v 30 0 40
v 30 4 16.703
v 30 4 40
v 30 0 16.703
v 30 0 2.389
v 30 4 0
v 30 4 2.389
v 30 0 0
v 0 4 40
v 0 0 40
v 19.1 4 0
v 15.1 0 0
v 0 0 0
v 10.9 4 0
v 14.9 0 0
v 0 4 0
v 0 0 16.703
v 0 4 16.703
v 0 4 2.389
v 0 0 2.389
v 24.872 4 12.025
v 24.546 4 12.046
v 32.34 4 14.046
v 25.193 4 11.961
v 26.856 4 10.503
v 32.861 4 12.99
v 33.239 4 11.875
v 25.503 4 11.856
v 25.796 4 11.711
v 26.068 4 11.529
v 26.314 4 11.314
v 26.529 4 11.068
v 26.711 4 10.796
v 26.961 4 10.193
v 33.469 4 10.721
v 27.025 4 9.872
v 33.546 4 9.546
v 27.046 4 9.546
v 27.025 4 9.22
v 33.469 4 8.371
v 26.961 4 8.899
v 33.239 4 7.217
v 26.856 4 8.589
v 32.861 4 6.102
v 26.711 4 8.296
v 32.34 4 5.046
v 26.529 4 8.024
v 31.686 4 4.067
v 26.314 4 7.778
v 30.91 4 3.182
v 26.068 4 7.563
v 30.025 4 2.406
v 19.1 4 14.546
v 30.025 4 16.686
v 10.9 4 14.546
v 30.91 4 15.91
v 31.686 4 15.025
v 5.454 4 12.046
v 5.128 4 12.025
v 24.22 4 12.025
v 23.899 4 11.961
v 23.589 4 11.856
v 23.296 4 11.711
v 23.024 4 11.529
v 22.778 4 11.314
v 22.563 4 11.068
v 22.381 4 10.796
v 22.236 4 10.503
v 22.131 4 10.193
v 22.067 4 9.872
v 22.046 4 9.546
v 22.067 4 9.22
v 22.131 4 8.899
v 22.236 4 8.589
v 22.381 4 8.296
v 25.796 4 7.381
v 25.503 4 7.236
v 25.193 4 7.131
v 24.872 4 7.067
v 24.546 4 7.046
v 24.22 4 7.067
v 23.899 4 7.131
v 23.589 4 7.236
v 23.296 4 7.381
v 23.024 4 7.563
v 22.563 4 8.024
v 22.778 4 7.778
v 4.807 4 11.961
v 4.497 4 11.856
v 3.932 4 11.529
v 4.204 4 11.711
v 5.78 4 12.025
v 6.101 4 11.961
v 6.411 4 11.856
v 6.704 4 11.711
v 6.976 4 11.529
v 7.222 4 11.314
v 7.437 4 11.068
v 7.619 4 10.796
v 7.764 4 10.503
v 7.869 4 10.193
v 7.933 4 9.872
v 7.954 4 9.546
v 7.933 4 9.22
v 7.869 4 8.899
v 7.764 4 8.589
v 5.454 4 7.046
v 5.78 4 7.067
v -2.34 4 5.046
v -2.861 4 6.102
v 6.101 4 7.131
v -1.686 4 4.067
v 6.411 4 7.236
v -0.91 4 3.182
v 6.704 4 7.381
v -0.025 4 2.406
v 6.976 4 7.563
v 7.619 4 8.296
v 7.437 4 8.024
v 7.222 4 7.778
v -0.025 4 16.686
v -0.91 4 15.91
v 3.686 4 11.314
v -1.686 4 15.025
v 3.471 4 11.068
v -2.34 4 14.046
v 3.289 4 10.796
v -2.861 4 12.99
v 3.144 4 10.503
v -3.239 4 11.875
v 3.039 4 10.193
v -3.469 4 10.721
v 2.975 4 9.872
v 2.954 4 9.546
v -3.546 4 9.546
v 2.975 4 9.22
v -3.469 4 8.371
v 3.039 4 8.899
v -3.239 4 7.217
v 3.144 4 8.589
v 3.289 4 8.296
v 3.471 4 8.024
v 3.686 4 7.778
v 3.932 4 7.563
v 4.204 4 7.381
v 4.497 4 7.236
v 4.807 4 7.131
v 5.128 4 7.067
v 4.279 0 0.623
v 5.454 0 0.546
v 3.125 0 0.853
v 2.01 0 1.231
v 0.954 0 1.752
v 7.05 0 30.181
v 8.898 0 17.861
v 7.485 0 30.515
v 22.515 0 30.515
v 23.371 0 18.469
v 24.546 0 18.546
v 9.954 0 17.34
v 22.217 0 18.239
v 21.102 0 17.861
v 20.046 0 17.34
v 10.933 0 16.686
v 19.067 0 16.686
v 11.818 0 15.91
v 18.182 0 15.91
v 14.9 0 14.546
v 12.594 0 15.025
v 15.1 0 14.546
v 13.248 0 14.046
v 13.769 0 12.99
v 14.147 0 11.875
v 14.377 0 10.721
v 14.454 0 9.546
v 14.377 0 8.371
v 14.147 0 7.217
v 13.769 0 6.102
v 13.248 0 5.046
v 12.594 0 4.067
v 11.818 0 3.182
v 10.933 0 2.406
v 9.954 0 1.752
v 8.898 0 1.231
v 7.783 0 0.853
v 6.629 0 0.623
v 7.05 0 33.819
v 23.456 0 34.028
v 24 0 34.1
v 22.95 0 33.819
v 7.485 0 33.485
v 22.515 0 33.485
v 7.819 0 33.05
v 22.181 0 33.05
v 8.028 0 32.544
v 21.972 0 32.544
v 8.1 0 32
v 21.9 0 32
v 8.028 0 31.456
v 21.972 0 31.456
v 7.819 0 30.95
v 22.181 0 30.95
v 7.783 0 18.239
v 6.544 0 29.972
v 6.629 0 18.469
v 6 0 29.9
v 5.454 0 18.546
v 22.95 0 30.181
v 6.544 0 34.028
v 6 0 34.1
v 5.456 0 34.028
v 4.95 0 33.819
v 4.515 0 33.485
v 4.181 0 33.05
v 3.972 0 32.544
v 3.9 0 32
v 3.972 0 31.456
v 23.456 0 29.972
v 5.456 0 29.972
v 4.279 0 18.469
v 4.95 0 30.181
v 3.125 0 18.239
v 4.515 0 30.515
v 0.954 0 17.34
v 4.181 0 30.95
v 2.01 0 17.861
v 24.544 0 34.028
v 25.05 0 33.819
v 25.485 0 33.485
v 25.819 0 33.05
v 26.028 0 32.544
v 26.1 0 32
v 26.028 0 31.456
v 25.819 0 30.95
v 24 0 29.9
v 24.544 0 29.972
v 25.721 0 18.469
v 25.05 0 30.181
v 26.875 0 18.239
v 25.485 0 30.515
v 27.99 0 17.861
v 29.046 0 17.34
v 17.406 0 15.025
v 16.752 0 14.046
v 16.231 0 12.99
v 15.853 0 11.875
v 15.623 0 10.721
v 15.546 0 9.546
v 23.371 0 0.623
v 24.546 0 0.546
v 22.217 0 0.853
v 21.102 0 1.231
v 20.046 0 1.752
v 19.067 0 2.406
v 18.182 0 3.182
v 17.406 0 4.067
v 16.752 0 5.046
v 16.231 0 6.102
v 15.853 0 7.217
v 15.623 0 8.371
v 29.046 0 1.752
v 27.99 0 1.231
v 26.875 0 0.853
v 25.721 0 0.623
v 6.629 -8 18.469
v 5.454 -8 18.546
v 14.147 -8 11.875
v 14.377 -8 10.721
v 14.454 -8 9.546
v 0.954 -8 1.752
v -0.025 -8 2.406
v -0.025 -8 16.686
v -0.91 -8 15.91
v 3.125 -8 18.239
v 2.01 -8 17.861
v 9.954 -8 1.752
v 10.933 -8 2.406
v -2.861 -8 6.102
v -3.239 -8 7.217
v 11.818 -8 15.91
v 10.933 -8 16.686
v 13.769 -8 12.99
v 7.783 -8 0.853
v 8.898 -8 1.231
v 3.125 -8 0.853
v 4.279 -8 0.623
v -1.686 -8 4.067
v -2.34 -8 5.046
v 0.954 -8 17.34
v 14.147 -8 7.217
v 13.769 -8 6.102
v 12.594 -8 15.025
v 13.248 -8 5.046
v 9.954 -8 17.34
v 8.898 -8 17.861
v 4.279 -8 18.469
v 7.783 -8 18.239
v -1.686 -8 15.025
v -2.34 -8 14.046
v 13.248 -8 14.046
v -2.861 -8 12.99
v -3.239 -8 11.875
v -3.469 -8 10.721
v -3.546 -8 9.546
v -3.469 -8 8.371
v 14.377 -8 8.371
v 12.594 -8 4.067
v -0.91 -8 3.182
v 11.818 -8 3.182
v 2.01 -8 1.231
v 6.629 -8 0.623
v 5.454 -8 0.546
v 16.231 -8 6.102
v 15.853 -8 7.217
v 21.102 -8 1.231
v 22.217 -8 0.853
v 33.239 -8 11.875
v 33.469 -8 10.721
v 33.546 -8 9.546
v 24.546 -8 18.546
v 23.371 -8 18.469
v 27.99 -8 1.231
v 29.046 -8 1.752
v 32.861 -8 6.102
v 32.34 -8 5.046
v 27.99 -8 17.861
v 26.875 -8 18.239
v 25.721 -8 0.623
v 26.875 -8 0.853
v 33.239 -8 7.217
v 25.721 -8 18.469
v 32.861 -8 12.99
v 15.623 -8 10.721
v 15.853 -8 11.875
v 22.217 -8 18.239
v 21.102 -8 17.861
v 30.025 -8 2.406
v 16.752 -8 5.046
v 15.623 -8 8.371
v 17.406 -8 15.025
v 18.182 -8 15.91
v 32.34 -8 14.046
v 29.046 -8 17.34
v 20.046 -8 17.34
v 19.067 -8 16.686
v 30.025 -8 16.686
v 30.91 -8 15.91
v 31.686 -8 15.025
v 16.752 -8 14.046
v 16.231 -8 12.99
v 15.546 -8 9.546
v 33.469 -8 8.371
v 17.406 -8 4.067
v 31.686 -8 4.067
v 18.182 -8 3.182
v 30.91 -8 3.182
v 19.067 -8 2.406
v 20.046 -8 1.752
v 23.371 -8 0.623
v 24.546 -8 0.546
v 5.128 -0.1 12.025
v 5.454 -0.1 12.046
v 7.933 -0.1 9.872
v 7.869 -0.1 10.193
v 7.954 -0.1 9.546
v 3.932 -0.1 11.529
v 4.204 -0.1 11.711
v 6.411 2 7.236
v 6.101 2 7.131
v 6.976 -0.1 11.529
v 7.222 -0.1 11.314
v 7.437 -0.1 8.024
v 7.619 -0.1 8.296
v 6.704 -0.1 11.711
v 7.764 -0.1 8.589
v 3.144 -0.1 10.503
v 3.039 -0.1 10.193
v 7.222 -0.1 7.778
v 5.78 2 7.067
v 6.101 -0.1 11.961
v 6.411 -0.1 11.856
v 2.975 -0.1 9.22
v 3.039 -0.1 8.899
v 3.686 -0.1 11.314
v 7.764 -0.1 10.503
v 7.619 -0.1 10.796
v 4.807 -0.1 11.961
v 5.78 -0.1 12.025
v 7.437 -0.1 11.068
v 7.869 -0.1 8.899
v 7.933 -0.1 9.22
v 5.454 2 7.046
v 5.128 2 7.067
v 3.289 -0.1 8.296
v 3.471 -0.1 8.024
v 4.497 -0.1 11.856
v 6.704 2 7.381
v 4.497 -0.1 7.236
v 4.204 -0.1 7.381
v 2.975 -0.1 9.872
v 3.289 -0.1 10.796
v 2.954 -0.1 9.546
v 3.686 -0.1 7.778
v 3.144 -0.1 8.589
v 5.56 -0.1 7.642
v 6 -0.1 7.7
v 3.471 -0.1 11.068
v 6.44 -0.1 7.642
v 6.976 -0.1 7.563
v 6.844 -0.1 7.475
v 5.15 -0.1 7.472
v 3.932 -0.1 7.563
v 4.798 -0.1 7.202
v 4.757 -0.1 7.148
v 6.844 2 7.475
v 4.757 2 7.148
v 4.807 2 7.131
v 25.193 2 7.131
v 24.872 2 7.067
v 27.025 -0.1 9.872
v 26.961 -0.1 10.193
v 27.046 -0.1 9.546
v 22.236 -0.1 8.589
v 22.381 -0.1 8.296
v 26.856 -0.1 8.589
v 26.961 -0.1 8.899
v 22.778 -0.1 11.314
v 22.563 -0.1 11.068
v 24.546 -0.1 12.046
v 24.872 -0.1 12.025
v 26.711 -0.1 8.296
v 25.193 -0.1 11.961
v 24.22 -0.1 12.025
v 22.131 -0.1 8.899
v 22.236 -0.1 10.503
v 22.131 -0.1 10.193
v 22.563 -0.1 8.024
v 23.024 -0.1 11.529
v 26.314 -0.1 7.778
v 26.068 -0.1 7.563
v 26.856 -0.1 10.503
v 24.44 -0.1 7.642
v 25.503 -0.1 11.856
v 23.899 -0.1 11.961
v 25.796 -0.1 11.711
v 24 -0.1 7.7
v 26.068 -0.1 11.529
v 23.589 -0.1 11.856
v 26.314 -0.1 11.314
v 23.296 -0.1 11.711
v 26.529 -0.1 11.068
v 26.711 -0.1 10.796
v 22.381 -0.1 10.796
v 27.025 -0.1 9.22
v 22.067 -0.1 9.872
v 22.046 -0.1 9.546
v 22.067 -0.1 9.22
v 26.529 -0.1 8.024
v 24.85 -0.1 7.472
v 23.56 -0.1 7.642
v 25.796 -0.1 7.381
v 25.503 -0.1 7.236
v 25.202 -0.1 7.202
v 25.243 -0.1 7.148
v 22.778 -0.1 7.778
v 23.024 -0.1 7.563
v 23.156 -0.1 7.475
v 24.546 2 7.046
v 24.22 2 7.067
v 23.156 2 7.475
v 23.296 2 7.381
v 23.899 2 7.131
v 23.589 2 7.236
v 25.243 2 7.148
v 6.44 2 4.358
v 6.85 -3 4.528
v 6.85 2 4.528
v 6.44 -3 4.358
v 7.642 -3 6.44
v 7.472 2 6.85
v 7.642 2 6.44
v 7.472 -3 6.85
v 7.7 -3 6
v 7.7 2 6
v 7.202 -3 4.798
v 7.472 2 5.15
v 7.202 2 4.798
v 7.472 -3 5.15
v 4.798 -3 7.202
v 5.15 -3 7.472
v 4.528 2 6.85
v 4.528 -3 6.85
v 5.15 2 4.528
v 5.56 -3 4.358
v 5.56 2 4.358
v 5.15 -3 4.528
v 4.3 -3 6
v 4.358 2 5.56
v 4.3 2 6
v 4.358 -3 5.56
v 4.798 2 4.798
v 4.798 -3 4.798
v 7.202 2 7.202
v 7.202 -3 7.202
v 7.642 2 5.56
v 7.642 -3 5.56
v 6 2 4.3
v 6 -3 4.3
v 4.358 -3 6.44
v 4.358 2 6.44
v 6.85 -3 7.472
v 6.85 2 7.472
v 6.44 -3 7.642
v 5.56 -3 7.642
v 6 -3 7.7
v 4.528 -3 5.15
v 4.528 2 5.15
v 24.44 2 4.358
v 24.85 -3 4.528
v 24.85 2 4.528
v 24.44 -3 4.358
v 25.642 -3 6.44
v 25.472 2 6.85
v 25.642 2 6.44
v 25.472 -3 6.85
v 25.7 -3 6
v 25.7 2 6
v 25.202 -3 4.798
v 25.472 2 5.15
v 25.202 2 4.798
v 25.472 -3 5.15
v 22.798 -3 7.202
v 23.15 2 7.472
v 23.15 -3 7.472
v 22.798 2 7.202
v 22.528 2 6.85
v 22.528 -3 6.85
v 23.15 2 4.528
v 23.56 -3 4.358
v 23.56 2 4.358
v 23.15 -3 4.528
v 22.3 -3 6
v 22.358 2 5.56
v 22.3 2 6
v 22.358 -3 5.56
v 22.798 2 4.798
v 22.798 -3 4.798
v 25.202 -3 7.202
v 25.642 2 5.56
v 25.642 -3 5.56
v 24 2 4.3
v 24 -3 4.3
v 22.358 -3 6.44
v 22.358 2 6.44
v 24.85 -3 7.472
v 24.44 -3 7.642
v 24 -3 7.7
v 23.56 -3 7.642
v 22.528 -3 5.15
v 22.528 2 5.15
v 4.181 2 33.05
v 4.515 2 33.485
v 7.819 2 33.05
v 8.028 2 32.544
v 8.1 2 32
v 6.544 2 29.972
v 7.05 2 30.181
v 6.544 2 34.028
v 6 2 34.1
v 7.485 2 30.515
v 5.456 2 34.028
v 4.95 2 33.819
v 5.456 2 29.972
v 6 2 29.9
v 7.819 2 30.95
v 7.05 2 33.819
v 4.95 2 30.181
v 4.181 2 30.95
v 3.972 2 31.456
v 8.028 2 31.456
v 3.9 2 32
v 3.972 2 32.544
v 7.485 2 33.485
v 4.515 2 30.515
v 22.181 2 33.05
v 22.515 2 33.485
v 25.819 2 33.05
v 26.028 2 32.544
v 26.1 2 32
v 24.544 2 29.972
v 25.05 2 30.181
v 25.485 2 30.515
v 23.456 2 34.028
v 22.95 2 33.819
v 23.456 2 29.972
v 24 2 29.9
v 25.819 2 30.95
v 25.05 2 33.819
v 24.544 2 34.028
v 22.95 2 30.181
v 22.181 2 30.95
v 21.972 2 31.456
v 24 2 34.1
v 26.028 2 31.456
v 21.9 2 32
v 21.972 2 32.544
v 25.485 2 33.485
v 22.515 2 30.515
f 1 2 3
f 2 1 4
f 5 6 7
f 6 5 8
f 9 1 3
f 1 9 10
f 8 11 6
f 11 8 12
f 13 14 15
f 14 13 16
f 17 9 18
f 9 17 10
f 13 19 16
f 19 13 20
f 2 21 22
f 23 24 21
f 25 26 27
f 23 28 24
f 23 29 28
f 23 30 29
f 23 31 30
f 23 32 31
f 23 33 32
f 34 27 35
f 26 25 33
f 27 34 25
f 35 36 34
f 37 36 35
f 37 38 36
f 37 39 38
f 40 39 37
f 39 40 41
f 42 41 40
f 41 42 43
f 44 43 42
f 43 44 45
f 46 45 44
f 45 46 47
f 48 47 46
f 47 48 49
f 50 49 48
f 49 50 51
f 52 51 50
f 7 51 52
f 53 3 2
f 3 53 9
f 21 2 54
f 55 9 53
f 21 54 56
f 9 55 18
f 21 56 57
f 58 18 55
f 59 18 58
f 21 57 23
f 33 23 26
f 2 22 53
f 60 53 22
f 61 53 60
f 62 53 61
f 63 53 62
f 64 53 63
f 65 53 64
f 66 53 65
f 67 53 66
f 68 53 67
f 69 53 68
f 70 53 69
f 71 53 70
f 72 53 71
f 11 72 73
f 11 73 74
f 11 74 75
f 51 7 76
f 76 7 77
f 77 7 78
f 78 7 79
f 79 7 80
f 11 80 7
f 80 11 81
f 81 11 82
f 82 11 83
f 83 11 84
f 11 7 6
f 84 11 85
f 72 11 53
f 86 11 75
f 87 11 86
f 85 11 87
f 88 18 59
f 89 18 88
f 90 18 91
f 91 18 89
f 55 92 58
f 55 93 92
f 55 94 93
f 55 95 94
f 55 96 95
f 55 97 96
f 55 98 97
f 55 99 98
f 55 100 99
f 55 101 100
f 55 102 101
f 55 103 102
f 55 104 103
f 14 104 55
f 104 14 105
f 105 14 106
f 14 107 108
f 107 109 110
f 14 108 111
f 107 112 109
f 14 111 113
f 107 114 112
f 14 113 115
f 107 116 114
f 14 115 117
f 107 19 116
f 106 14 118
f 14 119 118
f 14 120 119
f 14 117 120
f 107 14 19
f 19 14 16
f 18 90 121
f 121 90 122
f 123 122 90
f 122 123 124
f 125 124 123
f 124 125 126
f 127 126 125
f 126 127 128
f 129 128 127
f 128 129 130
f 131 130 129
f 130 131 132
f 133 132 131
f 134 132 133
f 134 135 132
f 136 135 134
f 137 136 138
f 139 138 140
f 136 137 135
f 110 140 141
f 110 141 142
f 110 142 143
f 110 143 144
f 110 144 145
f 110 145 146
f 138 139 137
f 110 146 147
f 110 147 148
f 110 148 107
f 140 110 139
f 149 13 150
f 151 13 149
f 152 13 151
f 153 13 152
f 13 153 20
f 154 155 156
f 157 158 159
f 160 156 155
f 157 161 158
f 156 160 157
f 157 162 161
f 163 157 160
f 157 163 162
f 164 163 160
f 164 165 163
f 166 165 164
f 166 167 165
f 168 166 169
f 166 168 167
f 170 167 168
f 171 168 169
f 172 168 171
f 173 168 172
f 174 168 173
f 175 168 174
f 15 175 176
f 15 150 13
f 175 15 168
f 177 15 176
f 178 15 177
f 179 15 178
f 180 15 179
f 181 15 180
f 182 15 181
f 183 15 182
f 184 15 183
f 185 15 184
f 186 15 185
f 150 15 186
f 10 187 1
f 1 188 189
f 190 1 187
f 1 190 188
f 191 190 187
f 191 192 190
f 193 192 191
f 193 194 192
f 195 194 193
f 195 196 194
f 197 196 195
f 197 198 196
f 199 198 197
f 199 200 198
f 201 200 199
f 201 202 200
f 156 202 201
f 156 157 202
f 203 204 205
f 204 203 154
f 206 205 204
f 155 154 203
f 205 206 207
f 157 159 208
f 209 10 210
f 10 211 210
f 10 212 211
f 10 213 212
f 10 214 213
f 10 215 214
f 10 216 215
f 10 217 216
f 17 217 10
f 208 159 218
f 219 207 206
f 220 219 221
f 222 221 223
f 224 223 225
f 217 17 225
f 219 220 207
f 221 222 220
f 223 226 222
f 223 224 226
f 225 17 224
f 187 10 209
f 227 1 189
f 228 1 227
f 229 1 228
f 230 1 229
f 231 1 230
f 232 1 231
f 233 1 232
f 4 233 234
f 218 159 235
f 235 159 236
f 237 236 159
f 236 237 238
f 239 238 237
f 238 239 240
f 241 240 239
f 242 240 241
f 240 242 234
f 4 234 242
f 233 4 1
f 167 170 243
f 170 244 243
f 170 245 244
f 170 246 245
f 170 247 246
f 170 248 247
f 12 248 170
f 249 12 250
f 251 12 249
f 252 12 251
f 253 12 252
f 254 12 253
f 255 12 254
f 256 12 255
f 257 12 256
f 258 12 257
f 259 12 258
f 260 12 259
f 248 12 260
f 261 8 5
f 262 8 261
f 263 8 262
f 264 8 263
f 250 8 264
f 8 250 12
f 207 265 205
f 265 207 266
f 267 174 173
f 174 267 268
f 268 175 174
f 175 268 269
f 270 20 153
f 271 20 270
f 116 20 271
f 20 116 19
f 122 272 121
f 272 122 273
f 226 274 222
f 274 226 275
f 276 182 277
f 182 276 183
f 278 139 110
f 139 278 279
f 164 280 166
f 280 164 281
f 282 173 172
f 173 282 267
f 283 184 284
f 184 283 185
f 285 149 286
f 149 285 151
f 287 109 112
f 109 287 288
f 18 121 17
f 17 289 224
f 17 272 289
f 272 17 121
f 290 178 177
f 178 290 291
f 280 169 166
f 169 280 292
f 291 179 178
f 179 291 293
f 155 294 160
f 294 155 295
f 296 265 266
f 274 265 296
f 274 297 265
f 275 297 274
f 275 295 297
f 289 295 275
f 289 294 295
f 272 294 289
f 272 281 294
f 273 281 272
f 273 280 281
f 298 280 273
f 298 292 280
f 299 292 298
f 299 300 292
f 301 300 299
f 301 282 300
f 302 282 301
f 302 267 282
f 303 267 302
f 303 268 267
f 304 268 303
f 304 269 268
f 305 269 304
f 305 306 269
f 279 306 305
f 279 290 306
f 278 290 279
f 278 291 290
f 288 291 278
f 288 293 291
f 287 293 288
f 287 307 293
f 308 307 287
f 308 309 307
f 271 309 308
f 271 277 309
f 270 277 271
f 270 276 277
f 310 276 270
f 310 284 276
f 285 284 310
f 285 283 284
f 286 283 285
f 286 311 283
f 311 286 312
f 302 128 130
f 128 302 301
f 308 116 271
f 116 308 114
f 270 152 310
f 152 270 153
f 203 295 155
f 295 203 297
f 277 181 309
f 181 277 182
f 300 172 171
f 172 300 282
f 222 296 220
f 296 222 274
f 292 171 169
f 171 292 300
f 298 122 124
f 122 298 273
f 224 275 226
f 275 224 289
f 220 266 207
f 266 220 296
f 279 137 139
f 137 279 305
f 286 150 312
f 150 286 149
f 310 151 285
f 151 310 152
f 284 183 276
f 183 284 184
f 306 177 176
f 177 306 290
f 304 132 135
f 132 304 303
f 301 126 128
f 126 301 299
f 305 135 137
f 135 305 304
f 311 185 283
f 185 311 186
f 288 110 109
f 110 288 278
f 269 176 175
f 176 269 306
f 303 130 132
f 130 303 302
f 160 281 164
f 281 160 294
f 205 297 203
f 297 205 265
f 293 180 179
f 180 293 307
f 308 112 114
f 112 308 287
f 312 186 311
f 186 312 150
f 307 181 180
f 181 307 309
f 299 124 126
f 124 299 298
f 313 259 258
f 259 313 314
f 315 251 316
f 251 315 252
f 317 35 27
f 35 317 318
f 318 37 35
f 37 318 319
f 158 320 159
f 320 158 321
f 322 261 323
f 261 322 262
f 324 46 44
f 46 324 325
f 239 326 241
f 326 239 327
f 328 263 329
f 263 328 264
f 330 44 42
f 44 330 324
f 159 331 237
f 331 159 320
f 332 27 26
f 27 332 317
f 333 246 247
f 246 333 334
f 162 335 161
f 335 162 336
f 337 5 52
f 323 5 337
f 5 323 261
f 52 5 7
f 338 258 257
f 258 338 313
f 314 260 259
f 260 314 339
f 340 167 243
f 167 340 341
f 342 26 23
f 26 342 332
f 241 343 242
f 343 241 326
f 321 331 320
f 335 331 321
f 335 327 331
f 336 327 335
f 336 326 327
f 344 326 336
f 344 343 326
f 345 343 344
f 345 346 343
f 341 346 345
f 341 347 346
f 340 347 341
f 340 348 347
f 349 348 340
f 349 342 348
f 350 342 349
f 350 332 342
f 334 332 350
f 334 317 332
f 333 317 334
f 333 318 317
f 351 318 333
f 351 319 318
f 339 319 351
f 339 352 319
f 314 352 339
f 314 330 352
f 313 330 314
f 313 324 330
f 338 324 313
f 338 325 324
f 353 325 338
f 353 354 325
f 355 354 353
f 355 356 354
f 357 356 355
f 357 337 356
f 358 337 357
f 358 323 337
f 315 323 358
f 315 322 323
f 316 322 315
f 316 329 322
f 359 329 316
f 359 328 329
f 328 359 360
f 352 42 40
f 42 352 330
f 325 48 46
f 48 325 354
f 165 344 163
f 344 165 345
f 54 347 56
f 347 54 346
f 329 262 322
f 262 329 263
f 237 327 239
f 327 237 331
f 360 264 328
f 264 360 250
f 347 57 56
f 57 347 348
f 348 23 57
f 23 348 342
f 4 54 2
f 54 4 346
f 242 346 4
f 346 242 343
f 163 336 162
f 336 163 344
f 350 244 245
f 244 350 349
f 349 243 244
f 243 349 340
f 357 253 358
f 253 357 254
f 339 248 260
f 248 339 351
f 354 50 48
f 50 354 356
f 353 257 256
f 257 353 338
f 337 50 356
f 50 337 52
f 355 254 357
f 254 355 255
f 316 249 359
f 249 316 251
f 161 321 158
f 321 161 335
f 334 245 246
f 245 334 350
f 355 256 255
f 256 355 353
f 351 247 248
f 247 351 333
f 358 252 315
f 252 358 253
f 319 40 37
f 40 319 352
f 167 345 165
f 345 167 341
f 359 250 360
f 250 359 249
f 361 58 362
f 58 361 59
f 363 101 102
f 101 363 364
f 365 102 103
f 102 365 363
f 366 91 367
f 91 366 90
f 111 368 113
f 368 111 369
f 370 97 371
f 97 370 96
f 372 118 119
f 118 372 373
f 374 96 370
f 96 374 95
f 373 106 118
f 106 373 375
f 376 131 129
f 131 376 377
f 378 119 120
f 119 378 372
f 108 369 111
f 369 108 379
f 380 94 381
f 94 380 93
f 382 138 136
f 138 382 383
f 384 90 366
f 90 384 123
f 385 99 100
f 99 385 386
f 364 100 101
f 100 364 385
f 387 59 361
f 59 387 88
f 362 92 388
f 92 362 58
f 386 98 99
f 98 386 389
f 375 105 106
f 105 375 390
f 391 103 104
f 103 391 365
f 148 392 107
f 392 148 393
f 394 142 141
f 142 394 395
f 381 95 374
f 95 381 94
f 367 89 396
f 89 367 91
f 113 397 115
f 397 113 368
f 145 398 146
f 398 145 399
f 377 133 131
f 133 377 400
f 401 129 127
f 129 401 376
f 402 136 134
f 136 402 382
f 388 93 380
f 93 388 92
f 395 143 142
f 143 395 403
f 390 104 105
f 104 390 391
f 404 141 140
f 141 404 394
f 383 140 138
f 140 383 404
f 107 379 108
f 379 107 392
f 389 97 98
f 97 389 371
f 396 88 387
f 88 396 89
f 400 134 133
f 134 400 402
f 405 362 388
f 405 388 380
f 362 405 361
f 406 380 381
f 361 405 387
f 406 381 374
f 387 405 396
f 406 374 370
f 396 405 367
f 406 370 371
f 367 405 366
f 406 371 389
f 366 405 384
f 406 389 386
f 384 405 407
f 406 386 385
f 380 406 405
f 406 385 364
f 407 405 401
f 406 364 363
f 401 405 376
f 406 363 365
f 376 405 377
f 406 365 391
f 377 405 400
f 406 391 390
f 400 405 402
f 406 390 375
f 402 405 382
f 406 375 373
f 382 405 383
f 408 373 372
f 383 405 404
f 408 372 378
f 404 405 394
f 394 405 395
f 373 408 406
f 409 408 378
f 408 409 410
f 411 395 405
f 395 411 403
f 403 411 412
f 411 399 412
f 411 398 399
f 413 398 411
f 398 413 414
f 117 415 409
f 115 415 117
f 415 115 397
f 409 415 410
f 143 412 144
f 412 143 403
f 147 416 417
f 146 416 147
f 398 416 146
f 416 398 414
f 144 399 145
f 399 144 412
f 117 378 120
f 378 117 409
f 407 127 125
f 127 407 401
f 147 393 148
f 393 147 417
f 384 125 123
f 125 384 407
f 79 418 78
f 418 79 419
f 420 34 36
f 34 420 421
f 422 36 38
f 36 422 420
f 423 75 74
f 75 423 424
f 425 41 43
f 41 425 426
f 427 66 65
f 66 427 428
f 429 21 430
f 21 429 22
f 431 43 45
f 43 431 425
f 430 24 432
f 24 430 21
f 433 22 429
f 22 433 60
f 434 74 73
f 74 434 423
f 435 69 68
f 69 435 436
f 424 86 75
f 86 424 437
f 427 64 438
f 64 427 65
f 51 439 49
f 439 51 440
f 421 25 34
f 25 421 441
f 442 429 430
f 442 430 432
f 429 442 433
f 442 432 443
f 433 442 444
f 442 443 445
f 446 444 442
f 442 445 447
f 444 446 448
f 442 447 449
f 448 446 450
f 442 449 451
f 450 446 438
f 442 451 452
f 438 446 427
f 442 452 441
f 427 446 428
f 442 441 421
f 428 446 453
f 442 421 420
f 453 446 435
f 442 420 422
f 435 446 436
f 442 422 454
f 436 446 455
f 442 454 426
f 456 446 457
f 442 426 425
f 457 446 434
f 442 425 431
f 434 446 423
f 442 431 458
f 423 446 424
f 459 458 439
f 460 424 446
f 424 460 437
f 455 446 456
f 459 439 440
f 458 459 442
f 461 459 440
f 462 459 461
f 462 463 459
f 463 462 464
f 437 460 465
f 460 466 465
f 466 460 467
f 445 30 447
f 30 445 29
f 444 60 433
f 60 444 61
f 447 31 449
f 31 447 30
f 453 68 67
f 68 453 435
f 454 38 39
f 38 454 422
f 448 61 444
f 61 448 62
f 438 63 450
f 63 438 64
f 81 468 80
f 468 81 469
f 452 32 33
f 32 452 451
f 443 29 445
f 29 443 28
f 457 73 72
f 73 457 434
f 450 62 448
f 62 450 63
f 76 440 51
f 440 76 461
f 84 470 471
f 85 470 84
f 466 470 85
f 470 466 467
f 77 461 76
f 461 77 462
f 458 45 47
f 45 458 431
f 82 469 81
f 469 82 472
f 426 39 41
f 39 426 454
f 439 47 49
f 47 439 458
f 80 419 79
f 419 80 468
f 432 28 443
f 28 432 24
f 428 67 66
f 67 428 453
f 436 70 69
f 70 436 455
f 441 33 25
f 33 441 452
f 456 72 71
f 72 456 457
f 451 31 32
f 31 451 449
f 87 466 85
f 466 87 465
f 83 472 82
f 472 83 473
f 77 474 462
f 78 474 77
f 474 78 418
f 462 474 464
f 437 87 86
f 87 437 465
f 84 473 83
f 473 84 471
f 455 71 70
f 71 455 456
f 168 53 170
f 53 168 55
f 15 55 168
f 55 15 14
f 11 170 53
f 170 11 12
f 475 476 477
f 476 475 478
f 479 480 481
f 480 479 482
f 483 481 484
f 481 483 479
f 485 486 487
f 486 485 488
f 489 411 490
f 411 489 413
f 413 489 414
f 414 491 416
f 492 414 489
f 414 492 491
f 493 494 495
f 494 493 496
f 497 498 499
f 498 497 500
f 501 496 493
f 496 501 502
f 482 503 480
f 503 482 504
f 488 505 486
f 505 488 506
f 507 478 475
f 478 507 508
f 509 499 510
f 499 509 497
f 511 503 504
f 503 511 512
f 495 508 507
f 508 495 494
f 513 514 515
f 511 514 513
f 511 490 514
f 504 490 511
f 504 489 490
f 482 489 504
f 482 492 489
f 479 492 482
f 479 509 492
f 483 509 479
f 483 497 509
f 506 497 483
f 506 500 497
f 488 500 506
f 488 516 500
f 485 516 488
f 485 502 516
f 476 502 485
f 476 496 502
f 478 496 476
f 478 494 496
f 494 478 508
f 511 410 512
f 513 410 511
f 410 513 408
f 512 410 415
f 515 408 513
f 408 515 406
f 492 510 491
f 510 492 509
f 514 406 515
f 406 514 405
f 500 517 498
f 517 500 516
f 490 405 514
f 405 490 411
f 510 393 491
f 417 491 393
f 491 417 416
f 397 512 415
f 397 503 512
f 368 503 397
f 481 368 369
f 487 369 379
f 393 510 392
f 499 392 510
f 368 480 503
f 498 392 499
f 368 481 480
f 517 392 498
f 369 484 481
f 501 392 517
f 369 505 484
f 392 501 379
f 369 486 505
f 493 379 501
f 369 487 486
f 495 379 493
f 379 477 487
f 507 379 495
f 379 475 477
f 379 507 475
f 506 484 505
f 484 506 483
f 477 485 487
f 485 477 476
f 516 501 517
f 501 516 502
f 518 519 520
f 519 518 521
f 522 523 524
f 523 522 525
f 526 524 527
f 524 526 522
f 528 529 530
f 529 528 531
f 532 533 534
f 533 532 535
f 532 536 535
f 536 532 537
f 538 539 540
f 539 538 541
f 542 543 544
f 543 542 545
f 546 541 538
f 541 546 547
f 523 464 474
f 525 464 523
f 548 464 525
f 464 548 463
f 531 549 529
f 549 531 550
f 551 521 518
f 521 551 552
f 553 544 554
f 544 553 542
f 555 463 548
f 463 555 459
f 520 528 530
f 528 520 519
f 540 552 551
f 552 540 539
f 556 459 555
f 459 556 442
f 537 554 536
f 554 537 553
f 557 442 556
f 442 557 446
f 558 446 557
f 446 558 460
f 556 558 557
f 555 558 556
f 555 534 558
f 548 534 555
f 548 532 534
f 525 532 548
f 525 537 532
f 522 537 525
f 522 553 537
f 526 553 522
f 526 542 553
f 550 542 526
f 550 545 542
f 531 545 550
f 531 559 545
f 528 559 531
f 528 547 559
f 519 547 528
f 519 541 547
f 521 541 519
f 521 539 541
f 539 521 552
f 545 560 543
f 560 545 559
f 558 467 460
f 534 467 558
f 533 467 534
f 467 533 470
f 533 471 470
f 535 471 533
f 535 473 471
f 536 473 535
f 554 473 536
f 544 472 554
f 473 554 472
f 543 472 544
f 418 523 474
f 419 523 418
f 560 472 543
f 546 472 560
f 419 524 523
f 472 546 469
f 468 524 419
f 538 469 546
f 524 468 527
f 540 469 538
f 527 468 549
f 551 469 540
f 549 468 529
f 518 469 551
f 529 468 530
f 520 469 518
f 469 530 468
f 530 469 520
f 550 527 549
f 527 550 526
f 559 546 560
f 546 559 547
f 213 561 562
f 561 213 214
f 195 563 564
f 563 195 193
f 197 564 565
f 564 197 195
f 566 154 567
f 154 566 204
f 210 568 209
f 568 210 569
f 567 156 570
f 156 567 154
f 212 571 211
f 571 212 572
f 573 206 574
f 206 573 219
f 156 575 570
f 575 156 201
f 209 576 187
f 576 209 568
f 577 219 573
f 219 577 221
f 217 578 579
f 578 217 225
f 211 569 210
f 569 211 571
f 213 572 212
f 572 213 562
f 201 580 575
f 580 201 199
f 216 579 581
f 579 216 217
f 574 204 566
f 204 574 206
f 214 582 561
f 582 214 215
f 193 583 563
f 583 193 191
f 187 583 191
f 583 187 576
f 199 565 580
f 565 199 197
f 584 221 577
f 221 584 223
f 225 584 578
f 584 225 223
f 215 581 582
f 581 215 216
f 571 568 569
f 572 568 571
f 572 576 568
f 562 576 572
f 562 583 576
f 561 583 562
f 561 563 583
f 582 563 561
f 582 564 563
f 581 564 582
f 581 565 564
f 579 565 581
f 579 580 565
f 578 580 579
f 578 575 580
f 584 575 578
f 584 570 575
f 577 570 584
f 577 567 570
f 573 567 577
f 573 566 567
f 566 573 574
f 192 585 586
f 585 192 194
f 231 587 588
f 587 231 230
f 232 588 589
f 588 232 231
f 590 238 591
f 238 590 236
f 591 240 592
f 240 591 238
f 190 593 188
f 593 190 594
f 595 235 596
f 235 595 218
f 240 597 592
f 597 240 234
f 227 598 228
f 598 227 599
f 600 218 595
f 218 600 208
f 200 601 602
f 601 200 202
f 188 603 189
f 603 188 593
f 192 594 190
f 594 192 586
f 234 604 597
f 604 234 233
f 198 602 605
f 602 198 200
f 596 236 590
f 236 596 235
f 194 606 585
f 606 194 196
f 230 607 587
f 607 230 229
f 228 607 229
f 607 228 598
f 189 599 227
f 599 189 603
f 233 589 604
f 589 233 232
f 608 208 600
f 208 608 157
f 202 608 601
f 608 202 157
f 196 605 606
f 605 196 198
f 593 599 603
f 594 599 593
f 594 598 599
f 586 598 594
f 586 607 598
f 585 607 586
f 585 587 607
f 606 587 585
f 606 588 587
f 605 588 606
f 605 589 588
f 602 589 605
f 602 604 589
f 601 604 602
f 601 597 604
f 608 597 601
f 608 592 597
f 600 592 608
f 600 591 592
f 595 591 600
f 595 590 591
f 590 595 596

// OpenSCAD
// =============================================
// Blueberry Grader - Roller End Bracket
// Holds two parallel roller shafts forming a V-groove
// Print one pair per lane-end (need 4 total per module)
// =============================================
// PRINT SETTINGS:
//   Material: PLA (frame) or PETG (better)
//   Layer height: 0.2mm
//   Infill: 40% - this is structural
//   Brim: ON 8mm
//   Supports: NO
// =============================================

// --- Parameters ---
roller_d        = 10;    // roller shaft outer diameter mm (with silicone tubing)
shaft_d         = 5;     // inner shaft diameter mm (PETG rod or wooden dowel)
v_angle         = 90;    // V-groove included angle degrees
pitch           = 22;    // berry center-to-center spacing mm
berry_d         = 17;    // max berry diameter mm
wall            = 4;     // wall thickness mm
bracket_h       = 40;    // bracket height mm
bracket_w       = 30;    // bracket width mm
bearing_depth   = 8;     // how deep the shaft sits in the bracket mm
m3_d            = 3.4;   // M3 bolt hole diameter
m3_head         = 6.5;   // M3 bolt head diameter
insert_d        = 4.2;   // heat set insert outer diameter
fn              = 48;

// --- Derived ---
half_angle  = v_angle / 2;  // 45 degrees each side
// Distance from V centerline to each roller center
// berry sits at center, rollers contact it at half_angle from vertical
roller_offset = (berry_d / 2 + roller_d / 2) * sin(half_angle);
// Height of roller centers above V bottom
roller_height = (berry_d / 2 + roller_d / 2) * cos(half_angle);

// =============================================
// BRACKET BODY
// =============================================
difference() {

    // Main bracket block
    union() {
        cube([bracket_w, wall, bracket_h]);

        // Roller cradle boss left
        translate([bracket_w/2 - roller_offset, wall, roller_height])
            rotate([90, 0, 0])
                cylinder(h = wall + bearing_depth, d = roller_d + wall*2, $fn=fn);

        // Roller cradle boss right
        translate([bracket_w/2 + roller_offset, wall, roller_height])
            rotate([90, 0, 0])
                cylinder(h = wall + bearing_depth, d = roller_d + wall*2, $fn=fn);
    }

    // Shaft hole left - berry rolls on left roller
    translate([bracket_w/2 - roller_offset, wall + bearing_depth + 0.1, roller_height])
        rotate([90, 0, 0])
            cylinder(h = wall + bearing_depth + 0.2, d = shaft_d, $fn=fn);

    // Shaft hole right
    translate([bracket_w/2 + roller_offset, wall + bearing_depth + 0.1, roller_height])
        rotate([90, 0, 0])
            cylinder(h = wall + bearing_depth + 0.2, d = shaft_d, $fn=fn);

    // V-groove cutout between roller bosses
    // Visualizes the V and removes material between bosses
    translate([bracket_w/2, -0.1, roller_height - 20])
        rotate([0, 0, 45])
            cube([20, 20, 25]);

    // M3 mounting holes bottom (for base plate attachment)
    translate([6, wall/2, 6])
        rotate([90, 0, 0])
            cylinder(h = wall + 1, d = m3_d, $fn=24);
    translate([bracket_w - 6, wall/2, 6])
        rotate([90, 0, 0])
            cylinder(h = wall + 1, d = m3_d, $fn=24);

    // Heat set insert holes top (for cross member attachment)
    translate([6, wall/2, bracket_h - 8])
        rotate([90, 0, 0])
            cylinder(h = 6, d = insert_d, $fn=24);
    translate([bracket_w - 6, wall/2, bracket_h - 8])
        rotate([90, 0, 0])
            cylinder(h = 6, d = insert_d, $fn=24);

}

// =============================================
// REFERENCE COMMENTS
// Roller center left:  x = bracket_w/2 - roller_offset
// Roller center right: x = bracket_w/2 + roller_offset  
// Roller height:       z = roller_height
// Berry sits at:       x = bracket_w/2, z = roller_height + roller_d/2 + berry_d/2
// =============================================
